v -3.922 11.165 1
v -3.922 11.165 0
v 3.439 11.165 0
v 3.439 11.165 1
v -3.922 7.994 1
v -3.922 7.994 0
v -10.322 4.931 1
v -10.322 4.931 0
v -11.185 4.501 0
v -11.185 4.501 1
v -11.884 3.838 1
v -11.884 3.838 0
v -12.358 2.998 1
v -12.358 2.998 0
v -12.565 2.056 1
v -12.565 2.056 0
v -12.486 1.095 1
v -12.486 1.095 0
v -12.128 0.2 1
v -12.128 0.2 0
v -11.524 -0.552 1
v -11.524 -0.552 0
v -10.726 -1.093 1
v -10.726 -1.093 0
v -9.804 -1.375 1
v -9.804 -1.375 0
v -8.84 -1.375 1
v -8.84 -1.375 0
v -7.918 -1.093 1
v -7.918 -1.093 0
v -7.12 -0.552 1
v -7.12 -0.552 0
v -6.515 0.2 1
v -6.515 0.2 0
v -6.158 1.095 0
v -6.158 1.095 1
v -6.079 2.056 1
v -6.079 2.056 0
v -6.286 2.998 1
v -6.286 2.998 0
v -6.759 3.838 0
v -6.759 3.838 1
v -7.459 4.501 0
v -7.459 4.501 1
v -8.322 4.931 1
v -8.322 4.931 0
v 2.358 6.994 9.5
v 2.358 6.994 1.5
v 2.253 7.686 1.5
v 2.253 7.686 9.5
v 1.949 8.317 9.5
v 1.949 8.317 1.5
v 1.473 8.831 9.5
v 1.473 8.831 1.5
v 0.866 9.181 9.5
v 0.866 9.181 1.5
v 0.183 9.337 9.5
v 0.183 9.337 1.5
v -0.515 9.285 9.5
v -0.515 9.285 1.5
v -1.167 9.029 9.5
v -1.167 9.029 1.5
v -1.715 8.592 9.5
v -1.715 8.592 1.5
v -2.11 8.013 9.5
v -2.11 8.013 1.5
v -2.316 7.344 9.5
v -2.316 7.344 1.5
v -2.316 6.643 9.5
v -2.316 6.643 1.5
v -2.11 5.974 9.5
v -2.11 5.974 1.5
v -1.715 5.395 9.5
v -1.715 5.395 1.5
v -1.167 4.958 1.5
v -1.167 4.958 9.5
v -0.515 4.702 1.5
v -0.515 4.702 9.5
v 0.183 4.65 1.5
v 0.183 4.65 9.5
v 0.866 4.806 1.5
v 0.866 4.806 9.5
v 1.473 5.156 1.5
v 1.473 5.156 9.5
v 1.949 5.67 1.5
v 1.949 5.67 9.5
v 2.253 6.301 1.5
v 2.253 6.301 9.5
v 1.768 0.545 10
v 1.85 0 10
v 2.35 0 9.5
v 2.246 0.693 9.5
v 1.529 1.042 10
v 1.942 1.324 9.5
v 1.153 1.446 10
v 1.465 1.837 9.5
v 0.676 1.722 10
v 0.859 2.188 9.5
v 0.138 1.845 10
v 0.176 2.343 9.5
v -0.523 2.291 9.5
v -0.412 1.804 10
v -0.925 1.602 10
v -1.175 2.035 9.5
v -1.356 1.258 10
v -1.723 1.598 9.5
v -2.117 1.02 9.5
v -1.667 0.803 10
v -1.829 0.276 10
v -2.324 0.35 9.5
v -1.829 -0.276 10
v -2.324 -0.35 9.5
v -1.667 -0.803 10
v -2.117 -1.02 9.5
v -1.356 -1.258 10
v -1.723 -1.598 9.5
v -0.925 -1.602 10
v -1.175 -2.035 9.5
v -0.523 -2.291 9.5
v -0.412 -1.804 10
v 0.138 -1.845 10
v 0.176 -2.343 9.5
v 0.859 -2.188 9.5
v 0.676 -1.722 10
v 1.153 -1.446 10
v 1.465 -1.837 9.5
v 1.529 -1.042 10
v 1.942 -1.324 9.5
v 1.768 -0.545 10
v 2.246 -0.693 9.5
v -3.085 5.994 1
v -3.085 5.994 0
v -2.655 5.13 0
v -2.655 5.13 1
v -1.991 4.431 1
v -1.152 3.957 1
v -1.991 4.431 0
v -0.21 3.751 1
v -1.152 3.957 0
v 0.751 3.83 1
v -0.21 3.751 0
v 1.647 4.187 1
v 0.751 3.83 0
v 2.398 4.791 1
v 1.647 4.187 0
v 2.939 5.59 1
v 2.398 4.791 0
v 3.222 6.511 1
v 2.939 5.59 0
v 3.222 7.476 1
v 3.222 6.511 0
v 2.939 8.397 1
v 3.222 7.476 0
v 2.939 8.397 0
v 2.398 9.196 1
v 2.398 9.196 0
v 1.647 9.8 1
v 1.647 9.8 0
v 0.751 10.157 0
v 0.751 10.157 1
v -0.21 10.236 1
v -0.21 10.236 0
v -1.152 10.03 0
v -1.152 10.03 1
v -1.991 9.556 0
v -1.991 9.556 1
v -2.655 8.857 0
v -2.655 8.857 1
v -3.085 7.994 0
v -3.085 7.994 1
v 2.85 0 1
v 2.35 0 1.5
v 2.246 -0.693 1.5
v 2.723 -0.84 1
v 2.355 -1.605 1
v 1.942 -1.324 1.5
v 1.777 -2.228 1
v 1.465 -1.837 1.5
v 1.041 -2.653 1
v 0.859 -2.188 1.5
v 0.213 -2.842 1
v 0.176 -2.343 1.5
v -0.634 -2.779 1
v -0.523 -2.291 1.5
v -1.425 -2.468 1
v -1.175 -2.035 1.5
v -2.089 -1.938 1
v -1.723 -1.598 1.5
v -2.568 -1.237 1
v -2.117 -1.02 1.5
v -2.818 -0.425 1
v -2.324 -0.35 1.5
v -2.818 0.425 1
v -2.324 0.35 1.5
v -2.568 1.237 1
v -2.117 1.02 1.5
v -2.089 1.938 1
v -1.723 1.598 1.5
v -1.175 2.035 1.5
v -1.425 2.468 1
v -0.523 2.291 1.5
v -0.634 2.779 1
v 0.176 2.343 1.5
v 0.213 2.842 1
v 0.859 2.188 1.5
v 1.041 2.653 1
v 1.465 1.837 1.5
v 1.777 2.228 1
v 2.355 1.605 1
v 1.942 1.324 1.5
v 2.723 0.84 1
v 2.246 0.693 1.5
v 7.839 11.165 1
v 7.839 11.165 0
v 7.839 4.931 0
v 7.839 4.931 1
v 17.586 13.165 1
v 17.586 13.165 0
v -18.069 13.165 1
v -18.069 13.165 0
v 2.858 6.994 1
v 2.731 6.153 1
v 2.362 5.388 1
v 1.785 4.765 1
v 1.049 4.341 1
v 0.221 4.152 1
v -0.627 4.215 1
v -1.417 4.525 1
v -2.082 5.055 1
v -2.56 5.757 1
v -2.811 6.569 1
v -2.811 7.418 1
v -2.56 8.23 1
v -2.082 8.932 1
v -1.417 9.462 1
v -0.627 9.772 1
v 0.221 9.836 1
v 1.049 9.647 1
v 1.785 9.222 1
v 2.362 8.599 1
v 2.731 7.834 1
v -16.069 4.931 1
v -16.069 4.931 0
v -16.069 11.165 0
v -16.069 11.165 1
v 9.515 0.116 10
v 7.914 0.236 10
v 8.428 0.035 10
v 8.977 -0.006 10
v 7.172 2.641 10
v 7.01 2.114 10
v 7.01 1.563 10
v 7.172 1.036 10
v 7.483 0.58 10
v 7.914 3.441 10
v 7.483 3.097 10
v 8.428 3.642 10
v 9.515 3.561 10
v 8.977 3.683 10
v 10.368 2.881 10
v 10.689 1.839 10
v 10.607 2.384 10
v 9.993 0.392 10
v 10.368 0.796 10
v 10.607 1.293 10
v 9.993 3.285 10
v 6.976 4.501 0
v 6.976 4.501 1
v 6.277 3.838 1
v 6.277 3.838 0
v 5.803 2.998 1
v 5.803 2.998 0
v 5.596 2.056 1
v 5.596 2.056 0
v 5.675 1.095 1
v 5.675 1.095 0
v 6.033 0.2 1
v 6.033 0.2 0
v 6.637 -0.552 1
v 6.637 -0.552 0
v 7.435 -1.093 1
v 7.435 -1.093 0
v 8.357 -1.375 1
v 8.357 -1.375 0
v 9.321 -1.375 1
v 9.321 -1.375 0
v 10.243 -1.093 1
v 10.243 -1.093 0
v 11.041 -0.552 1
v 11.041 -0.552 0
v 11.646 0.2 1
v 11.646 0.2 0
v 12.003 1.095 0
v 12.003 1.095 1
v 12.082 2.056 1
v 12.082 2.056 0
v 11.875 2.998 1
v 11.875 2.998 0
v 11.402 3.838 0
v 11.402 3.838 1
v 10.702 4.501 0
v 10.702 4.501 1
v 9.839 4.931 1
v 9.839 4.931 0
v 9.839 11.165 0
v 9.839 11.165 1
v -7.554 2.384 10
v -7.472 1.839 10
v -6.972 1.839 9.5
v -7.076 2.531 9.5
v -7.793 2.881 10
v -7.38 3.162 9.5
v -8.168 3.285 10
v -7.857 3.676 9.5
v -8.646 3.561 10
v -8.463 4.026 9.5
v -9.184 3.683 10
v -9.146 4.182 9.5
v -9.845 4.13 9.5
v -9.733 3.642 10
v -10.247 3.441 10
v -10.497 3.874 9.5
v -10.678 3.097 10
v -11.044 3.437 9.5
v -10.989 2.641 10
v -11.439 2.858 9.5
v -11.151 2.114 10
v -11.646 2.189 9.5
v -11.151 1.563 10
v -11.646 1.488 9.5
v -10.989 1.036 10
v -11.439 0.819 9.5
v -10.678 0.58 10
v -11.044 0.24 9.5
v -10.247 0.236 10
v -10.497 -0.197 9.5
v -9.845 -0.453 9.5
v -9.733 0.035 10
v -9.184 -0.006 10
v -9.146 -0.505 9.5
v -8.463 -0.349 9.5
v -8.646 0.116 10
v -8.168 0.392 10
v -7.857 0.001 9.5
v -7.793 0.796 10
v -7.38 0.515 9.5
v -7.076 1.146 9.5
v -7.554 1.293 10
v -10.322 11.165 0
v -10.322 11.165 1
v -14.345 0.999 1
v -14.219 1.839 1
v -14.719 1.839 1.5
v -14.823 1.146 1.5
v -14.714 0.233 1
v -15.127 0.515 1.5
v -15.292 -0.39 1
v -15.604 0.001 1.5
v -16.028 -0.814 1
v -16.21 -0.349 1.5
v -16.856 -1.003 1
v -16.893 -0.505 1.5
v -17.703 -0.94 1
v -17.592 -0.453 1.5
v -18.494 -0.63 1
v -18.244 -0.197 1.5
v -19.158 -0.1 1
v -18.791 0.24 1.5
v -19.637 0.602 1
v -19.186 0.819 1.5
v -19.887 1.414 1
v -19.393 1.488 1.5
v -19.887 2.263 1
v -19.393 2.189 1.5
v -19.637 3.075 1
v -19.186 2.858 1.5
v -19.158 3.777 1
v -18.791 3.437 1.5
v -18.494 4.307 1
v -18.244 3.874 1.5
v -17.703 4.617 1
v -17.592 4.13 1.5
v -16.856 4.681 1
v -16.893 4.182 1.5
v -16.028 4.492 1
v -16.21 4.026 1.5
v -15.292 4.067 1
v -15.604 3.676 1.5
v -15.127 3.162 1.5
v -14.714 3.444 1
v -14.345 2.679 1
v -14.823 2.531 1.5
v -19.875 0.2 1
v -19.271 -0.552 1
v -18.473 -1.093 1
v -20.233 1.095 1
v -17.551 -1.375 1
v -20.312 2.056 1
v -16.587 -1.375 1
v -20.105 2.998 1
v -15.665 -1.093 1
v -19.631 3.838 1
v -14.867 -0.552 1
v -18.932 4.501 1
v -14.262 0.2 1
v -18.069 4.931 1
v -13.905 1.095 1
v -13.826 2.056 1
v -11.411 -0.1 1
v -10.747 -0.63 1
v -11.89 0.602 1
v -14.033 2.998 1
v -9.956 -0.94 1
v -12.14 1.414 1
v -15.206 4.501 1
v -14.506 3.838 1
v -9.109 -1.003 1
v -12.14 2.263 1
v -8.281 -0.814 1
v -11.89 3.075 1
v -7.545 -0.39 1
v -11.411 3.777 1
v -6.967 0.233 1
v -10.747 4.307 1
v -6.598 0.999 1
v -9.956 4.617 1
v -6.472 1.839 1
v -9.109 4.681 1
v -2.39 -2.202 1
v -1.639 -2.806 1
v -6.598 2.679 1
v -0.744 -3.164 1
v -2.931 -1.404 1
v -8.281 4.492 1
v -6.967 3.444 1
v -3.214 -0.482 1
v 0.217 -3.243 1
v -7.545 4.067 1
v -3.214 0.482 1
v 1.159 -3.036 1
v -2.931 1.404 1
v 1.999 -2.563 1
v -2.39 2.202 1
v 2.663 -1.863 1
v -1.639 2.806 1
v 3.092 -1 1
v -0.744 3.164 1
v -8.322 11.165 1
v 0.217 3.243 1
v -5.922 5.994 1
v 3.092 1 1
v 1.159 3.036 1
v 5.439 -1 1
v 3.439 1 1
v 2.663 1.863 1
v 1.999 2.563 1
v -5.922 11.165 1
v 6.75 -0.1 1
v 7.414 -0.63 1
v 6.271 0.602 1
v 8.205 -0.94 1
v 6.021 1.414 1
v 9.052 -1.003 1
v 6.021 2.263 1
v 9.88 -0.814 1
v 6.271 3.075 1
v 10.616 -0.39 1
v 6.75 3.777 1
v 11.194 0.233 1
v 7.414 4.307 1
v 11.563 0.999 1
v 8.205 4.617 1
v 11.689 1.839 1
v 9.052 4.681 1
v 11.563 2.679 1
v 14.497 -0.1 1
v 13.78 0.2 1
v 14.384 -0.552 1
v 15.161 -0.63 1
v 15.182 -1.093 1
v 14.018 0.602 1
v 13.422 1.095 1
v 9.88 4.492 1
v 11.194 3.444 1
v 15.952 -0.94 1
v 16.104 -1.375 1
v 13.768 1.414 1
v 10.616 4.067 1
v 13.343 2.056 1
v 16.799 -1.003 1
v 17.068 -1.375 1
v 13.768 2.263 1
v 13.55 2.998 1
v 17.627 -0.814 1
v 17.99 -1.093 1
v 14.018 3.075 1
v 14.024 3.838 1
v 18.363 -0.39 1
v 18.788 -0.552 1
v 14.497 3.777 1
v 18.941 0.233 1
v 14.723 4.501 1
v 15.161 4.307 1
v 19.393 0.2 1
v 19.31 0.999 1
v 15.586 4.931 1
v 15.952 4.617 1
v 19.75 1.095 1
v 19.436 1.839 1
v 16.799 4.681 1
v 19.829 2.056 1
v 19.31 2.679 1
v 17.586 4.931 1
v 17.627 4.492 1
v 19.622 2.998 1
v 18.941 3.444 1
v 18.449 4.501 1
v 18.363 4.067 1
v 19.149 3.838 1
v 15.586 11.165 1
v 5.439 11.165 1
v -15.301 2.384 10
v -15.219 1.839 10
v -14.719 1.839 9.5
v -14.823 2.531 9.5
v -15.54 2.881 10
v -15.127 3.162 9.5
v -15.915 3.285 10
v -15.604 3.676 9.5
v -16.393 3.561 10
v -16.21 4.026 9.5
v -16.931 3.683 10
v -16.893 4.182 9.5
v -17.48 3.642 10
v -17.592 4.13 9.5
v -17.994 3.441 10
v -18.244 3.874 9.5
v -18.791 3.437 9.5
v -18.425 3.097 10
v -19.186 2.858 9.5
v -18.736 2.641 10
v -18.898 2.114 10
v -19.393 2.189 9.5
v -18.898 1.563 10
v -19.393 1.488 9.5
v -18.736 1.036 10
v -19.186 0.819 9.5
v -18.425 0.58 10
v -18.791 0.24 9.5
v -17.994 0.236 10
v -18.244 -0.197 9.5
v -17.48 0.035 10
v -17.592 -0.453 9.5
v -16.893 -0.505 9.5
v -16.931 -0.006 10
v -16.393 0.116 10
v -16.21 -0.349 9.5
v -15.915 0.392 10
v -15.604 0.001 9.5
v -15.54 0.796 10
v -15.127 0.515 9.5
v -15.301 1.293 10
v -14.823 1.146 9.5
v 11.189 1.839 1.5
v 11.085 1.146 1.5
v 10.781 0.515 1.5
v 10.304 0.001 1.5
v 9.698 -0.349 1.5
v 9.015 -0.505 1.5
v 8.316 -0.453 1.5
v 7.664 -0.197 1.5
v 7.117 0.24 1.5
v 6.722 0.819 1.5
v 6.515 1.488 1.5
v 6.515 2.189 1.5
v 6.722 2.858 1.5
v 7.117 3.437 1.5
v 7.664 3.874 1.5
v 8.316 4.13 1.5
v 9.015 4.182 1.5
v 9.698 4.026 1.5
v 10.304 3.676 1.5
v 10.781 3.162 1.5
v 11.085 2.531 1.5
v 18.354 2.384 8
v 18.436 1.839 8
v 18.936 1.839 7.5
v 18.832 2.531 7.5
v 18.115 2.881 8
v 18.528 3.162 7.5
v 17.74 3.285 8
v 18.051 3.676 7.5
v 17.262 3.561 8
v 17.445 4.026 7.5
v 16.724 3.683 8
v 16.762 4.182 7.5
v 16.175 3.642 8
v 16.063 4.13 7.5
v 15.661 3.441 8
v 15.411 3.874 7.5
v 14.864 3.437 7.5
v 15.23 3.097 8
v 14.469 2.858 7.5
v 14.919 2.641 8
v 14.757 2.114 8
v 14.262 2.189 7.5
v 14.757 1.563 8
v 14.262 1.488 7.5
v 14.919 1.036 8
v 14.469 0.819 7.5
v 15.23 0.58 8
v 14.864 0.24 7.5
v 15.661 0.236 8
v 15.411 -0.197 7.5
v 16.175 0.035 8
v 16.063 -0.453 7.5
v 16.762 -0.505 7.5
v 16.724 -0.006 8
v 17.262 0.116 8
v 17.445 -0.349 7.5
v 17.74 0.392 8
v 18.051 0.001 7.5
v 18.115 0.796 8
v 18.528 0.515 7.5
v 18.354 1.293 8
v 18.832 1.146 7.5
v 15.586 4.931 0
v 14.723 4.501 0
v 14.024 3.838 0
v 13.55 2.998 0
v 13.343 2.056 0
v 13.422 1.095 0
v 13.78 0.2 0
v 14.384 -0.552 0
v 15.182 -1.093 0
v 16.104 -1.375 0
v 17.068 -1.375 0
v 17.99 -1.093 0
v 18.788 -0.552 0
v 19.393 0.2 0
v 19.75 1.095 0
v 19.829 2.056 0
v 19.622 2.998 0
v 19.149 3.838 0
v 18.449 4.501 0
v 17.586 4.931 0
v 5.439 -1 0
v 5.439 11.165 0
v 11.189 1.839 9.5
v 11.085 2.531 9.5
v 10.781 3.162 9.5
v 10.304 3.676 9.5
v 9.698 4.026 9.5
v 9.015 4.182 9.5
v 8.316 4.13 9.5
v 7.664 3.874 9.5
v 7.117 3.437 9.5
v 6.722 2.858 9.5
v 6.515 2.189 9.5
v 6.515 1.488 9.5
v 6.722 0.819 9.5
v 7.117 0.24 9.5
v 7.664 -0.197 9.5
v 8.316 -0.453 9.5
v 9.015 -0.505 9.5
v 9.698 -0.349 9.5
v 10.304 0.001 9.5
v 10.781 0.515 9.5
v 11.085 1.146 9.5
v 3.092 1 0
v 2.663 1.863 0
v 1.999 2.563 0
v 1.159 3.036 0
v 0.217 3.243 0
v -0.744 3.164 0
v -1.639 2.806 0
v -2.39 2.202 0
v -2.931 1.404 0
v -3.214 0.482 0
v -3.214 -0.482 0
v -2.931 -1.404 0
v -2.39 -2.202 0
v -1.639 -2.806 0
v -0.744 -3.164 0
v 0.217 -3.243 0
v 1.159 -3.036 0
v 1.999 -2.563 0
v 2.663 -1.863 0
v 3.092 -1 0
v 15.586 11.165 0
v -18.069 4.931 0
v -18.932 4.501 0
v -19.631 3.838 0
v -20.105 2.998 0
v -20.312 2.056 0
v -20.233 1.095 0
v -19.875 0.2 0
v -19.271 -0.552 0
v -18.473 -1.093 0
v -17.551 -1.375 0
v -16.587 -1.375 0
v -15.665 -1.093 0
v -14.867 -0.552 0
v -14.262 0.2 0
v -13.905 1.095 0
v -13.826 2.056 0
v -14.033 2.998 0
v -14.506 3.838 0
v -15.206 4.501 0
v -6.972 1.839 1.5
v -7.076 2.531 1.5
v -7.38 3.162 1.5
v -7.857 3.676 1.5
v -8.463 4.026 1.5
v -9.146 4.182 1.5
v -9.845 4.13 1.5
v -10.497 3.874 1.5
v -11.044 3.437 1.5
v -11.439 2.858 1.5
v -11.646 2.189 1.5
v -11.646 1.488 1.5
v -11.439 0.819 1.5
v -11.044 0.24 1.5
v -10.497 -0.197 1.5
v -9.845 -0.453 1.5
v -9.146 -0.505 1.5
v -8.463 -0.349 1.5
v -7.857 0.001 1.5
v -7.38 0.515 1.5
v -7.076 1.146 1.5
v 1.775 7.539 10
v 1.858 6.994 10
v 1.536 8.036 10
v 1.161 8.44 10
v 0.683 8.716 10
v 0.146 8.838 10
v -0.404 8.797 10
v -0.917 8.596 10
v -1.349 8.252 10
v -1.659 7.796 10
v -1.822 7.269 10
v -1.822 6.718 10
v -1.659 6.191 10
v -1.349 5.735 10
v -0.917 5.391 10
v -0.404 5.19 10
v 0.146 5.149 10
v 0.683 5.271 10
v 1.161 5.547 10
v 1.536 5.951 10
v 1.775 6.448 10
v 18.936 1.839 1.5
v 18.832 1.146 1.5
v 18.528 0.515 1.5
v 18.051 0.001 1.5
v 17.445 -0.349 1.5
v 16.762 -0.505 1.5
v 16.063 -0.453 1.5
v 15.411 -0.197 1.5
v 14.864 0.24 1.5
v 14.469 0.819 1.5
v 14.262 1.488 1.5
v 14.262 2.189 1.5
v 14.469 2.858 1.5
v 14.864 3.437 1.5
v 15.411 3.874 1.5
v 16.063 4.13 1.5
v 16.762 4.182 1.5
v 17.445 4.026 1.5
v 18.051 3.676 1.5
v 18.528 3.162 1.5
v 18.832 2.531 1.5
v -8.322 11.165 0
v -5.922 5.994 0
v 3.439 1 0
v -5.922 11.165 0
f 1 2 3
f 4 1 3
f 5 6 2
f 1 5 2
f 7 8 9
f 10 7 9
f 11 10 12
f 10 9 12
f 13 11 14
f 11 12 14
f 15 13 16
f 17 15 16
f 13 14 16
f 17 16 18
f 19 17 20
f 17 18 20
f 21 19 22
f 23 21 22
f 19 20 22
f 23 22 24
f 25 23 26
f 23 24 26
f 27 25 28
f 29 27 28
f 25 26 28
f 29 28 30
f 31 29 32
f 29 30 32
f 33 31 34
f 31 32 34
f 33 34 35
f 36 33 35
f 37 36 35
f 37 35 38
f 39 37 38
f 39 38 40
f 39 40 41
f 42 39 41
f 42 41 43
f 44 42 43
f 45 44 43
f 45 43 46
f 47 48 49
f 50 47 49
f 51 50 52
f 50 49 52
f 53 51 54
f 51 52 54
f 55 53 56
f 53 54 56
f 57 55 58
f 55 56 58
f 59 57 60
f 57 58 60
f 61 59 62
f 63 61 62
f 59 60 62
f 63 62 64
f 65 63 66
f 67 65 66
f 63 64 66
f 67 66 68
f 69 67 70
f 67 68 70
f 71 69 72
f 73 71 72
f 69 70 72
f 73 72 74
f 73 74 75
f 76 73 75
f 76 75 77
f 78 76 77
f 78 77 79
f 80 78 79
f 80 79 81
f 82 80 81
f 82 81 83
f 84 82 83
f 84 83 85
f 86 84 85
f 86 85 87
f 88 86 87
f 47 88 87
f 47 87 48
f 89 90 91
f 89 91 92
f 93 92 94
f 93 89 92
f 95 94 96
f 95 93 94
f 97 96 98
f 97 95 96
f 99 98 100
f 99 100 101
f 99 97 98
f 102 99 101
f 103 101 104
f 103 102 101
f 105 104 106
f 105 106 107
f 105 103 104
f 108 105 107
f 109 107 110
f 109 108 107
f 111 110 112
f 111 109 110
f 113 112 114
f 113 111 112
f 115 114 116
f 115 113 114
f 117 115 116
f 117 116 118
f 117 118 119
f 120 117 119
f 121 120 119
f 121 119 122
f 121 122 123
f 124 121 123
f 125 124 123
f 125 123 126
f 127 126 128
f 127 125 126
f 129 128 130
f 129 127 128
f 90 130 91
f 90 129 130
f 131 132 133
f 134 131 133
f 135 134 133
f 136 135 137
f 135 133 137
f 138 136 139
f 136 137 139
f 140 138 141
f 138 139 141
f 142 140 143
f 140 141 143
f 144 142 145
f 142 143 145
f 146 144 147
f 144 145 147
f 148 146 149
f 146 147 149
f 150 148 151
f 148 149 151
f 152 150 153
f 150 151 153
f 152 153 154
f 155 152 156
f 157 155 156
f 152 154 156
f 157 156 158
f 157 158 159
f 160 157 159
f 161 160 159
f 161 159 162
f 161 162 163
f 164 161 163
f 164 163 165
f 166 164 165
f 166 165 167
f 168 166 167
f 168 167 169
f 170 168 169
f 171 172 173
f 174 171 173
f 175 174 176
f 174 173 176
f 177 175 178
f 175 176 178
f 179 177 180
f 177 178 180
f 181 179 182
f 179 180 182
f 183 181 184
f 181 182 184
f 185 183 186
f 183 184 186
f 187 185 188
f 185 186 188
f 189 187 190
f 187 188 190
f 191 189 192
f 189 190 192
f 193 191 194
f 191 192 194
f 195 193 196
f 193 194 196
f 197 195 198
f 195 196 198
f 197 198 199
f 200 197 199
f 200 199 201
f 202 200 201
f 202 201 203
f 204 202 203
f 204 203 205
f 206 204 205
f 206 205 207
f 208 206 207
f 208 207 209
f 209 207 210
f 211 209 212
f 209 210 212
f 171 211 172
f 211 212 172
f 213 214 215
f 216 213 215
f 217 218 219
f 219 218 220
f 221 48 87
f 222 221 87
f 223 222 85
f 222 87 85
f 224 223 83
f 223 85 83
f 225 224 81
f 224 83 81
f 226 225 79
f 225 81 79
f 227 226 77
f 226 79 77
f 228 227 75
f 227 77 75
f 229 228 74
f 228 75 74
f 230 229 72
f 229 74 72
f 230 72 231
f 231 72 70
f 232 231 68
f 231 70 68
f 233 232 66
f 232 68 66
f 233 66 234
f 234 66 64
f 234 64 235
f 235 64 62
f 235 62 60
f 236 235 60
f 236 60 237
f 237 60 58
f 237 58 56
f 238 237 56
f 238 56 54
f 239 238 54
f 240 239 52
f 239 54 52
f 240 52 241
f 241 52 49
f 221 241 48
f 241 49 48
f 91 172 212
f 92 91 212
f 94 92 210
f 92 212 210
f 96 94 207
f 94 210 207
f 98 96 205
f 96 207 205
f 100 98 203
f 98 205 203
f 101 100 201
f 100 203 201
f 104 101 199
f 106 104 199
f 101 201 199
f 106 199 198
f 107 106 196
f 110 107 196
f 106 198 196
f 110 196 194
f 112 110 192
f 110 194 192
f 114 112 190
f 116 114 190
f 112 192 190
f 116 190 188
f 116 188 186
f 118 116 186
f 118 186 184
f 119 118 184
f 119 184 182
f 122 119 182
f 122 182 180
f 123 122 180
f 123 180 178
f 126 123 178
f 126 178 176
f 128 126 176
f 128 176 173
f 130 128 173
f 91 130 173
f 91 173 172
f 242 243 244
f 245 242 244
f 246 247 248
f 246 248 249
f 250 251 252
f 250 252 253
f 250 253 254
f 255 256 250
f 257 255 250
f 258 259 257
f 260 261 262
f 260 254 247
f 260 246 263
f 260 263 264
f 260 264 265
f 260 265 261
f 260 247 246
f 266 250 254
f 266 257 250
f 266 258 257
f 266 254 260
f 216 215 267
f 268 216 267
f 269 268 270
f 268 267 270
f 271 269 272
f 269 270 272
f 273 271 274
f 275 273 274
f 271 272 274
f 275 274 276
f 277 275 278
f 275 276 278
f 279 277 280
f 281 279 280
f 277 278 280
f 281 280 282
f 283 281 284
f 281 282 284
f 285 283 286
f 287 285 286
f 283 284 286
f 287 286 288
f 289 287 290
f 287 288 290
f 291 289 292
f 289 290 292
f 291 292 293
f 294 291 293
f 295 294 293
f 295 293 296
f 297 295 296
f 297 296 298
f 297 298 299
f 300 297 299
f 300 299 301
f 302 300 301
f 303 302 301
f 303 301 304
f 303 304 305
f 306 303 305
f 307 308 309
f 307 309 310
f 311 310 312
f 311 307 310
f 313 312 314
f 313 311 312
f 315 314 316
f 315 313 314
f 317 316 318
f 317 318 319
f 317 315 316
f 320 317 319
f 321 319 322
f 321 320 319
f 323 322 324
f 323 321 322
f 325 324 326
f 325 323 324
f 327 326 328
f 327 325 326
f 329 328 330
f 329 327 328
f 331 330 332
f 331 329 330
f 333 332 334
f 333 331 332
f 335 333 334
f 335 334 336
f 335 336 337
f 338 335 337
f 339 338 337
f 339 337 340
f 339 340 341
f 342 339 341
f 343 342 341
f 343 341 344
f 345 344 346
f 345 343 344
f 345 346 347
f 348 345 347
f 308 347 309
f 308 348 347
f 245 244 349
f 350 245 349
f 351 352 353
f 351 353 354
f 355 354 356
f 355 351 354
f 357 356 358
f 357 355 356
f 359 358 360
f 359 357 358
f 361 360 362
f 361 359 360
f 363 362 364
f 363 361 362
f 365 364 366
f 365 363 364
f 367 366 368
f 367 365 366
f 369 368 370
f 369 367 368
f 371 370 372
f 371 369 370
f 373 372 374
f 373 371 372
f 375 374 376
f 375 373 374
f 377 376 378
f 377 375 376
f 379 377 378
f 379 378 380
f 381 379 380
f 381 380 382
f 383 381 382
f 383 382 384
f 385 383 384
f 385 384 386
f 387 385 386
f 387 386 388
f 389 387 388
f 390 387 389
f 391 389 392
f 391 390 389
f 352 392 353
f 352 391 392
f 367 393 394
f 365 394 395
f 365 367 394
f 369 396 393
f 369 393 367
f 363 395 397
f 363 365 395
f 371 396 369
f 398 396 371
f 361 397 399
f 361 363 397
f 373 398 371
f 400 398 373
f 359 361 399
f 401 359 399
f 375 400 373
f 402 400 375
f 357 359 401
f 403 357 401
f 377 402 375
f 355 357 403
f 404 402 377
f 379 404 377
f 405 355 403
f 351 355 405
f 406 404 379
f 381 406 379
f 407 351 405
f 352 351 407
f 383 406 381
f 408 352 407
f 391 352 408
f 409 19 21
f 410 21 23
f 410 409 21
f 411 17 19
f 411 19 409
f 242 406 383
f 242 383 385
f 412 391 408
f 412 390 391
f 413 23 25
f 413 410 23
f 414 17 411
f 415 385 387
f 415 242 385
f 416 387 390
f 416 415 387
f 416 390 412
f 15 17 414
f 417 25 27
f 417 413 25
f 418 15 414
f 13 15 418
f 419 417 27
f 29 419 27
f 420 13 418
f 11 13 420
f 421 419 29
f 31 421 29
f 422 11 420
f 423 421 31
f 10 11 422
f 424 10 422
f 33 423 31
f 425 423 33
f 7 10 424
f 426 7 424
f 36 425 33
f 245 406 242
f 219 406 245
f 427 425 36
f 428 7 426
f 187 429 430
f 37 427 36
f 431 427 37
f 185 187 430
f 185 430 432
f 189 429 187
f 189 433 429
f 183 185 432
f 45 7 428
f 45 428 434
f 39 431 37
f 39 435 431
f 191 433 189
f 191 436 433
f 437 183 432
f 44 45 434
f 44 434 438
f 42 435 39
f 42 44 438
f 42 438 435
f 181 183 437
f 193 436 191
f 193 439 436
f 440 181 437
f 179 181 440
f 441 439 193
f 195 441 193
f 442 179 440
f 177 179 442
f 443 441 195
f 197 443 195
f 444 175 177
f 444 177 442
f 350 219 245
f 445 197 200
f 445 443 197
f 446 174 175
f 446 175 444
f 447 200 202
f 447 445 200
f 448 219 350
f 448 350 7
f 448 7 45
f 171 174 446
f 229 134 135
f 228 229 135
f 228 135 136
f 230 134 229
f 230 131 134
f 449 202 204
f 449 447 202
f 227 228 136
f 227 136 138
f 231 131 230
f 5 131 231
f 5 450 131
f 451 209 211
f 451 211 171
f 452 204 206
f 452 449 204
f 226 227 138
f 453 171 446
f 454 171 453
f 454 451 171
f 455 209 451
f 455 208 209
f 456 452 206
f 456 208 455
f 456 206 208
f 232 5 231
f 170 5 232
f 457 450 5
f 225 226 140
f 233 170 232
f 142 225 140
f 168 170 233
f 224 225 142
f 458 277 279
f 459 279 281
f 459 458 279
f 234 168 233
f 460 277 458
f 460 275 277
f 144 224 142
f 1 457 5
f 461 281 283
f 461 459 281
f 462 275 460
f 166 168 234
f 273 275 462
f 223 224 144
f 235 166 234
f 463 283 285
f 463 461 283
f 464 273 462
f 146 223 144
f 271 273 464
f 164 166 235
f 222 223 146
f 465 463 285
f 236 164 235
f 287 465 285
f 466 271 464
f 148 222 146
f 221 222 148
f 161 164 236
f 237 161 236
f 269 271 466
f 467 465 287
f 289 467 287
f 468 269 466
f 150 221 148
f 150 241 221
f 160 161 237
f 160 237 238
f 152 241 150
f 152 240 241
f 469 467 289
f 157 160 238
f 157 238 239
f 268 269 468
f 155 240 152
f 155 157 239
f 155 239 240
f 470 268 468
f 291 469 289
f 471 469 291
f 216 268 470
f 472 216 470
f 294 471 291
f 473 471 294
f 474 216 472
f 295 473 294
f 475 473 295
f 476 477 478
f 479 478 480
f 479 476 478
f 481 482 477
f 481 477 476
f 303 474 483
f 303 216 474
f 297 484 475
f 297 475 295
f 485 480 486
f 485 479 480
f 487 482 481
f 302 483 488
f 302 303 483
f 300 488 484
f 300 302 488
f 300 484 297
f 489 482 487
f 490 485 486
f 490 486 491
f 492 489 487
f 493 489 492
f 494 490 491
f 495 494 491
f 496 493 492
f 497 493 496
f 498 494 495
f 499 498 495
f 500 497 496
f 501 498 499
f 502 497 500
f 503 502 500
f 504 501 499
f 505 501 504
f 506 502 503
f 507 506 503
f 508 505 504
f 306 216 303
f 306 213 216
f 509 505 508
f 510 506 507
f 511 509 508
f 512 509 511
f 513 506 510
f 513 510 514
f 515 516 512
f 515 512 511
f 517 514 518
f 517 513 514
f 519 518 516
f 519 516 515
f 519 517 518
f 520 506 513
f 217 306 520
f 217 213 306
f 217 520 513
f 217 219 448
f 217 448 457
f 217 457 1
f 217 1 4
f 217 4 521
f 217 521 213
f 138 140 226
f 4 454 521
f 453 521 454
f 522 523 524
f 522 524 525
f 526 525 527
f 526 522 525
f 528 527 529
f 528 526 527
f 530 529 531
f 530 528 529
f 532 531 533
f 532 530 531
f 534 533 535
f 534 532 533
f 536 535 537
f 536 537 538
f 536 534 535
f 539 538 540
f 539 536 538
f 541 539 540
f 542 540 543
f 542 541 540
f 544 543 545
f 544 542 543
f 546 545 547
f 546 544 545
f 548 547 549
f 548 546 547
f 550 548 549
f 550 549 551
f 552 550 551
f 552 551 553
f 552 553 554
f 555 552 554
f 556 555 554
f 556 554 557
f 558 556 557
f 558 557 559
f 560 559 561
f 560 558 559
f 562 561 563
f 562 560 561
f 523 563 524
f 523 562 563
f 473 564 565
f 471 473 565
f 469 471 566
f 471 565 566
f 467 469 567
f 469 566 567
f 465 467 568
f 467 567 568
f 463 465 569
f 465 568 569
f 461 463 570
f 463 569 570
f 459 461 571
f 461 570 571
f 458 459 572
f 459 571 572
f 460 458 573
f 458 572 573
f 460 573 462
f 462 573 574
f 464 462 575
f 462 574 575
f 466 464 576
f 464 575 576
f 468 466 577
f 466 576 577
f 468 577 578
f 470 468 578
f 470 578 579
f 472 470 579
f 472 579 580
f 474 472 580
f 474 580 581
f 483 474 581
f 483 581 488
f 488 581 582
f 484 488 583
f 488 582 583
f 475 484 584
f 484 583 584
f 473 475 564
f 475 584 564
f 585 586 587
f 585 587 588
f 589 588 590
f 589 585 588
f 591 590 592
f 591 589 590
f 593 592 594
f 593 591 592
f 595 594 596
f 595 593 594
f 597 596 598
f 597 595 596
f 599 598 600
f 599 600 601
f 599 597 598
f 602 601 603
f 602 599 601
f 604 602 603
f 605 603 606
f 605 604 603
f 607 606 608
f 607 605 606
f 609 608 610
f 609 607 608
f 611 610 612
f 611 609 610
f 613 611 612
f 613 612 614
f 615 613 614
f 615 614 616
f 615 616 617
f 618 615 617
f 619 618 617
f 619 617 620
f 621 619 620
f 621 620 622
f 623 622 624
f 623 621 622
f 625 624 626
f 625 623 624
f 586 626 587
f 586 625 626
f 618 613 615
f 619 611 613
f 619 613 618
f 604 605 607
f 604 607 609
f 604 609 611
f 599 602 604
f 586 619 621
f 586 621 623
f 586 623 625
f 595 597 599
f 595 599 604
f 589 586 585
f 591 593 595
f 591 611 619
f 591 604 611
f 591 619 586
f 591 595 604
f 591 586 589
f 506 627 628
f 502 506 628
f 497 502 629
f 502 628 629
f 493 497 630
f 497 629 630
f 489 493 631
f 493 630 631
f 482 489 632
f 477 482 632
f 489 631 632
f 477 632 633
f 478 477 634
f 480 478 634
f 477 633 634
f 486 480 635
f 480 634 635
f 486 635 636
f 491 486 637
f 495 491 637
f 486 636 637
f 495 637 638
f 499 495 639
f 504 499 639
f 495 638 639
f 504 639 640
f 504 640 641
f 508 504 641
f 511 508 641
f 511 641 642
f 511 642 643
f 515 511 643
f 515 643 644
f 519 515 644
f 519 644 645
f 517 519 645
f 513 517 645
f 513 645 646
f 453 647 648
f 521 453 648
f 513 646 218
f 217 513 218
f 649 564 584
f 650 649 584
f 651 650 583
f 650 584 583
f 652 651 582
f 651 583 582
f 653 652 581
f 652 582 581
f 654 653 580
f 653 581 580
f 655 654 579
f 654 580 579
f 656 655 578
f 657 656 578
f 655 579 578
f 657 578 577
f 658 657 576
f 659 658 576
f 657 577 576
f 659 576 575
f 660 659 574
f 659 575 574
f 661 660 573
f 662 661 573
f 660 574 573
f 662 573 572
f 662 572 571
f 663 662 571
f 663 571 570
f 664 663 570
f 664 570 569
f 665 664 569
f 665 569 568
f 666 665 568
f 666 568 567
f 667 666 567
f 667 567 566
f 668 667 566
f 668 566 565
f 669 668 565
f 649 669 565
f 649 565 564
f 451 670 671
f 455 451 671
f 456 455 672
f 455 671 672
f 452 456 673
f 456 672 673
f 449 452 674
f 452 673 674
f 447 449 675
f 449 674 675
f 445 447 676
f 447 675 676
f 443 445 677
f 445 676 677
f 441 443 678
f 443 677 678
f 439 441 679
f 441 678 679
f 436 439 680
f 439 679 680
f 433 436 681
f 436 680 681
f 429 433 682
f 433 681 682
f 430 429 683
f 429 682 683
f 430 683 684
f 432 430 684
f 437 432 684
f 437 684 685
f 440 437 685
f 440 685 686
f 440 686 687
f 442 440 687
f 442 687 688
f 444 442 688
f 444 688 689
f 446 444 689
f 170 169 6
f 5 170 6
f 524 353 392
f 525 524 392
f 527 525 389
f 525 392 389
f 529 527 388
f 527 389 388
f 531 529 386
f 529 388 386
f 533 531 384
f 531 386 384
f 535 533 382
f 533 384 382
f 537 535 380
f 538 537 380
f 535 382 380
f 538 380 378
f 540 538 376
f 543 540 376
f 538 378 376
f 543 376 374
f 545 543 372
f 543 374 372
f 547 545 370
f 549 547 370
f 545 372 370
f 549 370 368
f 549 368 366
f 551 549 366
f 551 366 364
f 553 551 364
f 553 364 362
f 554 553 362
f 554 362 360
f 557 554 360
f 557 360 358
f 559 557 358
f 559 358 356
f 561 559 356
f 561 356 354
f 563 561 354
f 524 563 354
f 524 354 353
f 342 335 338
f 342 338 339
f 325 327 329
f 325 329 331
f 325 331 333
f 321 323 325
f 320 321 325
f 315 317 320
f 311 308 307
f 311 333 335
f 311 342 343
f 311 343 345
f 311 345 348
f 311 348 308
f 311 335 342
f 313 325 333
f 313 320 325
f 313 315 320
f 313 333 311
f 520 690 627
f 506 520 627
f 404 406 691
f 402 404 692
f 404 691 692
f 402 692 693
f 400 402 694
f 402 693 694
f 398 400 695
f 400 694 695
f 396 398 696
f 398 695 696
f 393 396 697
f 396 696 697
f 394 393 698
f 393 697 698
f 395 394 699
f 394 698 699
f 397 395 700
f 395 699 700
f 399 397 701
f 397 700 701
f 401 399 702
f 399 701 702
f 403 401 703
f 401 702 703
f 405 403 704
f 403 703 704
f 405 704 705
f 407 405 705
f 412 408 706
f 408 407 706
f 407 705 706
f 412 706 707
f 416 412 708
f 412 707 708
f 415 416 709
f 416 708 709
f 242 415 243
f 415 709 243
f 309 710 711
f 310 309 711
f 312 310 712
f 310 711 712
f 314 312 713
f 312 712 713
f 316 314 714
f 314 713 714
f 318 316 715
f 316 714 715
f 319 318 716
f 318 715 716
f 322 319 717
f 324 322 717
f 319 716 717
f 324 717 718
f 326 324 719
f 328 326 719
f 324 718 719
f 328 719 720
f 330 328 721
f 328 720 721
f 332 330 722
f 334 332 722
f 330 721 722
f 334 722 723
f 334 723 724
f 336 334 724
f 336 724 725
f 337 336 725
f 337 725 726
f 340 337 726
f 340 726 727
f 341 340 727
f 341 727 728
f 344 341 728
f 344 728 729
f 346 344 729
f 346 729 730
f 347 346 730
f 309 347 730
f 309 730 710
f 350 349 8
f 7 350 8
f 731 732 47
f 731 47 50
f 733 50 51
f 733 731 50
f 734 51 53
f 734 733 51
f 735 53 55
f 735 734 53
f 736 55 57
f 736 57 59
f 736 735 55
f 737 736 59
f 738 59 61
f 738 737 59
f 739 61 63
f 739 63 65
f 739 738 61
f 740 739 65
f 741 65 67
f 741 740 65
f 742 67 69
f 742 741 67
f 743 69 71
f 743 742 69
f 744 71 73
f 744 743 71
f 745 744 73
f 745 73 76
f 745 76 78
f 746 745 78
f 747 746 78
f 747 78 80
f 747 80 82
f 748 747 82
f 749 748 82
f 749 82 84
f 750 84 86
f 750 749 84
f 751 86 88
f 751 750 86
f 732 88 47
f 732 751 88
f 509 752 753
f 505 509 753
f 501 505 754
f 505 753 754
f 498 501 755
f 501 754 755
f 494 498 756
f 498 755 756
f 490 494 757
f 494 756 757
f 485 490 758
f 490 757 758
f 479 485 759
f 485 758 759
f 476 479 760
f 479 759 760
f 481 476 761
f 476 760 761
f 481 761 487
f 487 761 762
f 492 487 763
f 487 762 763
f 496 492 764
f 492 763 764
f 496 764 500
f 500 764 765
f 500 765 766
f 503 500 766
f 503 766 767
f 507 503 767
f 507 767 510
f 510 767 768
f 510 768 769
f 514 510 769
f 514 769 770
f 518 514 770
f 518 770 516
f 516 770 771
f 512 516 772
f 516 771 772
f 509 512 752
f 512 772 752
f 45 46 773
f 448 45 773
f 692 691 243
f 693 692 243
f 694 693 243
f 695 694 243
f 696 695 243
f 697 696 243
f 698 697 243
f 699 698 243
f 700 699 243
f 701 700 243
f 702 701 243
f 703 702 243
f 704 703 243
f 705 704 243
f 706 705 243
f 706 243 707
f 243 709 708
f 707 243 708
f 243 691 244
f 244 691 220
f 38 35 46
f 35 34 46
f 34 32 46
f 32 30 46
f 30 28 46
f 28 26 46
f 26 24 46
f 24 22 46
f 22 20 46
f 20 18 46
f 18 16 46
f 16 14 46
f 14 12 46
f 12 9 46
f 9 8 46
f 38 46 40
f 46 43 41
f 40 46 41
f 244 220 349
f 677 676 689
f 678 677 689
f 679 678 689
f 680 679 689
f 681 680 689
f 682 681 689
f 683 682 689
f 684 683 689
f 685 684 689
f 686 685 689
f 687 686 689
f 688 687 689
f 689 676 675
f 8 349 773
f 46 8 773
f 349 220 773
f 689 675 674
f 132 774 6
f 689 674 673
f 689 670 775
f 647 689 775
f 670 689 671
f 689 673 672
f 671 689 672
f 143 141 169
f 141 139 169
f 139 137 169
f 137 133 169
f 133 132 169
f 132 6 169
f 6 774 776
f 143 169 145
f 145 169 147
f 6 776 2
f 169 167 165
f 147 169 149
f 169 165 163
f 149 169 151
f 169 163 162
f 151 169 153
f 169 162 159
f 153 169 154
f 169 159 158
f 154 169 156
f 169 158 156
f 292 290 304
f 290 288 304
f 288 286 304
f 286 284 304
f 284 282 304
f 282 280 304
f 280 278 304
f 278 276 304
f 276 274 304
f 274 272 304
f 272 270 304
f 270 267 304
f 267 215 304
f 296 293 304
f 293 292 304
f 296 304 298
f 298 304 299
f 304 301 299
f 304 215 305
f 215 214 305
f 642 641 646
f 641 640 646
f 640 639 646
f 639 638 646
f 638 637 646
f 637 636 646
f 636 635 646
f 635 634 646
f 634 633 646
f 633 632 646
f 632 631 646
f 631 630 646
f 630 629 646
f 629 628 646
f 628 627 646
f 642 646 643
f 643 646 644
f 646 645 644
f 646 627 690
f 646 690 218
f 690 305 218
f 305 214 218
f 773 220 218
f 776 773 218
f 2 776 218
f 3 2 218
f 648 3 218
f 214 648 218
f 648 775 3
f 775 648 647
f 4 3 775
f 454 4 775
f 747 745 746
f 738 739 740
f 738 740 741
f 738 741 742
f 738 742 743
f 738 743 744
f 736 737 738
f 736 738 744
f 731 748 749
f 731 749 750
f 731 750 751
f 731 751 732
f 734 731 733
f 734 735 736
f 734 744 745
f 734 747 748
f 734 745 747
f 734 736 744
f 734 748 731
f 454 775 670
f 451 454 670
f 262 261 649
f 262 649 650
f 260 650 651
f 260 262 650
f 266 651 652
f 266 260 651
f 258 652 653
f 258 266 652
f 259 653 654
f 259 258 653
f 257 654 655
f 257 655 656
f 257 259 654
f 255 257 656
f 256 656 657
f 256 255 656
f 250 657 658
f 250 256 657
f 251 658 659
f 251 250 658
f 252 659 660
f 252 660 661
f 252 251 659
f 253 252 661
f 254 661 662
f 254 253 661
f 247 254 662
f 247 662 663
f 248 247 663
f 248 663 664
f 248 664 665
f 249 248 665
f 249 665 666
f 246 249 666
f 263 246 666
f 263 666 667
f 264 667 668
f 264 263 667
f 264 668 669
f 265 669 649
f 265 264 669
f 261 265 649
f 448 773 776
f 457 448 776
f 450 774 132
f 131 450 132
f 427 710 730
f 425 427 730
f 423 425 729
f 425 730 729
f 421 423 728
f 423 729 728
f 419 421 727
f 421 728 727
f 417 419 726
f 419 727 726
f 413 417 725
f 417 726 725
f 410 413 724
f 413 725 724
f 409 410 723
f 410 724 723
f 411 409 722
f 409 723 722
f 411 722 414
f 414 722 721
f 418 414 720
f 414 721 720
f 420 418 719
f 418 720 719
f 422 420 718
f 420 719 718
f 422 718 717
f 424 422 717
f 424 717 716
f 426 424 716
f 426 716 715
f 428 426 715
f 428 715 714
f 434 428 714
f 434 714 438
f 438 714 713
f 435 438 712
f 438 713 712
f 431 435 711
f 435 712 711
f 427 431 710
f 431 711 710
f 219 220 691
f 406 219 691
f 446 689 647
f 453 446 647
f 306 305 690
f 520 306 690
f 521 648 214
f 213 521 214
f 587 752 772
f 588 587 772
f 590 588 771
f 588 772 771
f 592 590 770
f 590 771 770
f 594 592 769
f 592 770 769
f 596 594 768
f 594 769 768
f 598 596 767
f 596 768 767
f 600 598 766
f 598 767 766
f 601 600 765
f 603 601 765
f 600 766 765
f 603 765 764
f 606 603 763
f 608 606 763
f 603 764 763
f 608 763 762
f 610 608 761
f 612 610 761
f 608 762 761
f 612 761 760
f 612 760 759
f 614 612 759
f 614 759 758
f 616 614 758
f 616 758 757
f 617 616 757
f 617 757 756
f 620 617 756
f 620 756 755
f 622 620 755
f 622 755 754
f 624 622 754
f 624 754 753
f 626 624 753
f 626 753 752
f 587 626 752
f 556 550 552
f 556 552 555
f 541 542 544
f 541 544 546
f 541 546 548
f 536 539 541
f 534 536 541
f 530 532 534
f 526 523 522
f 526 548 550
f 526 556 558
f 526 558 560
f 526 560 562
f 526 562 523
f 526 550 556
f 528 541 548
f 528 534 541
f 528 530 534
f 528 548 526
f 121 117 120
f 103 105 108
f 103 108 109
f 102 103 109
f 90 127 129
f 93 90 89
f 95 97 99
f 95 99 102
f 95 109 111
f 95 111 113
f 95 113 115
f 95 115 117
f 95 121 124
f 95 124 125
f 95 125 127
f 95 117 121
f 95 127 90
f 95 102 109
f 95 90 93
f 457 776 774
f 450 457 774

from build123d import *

# Parameters (mm, degrees)
SKIZZE1_R                         = 2.35
AUFSATZ_LINEAR_AUSTRAGEN1_DEPTH   = 10
AUFSATZ_LINEAR_AUSTRAGEN1_2_DEPTH = 10
AUFSATZ_LINEAR_AUSTRAGEN1_3_DEPTH = 10
AUFSATZ_LINEAR_AUSTRAGEN1_4_DEPTH = 10
AUFSATZ_LINEAR_AUSTRAGEN1_5_DEPTH = 10
SKIZZE1_3_R                       = 2.35
AUFSATZ_LINEAR_AUSTRAGEN4_DEPTH   = 8
SKIZZE2_R                         = 3.25
AUFSATZ_LINEAR_AUSTRAGEN2_DEPTH   = 1
AUFSATZ_LINEAR_AUSTRAGEN3_DEPTH   = 1
FASE1_SIZE                        = 0.5
FASE2_SIZE                        = 0.5
FASE3_SIZE                        = 0.5


with BuildPart() as part:
    # Skizze1 → Aufsatz-Linear austragen1 (new body)
    with BuildSketch(Plane.XY):
        with Locations((-17.068817434, 1.838554139)):
            Circle(SKIZZE1_R)
    extrude(amount=AUFSATZ_LINEAR_AUSTRAGEN1_DEPTH)



with BuildPart() as body_2:
    # Skizze1 → Aufsatz-Linear austragen1 2 (new body)
    with BuildSketch(Plane.XY):
        with Locations((-9.321817434, 1.838554139)):
            Circle(SKIZZE1_R)
    extrude(amount=AUFSATZ_LINEAR_AUSTRAGEN1_2_DEPTH)


with BuildPart() as body_3:
    # Skizze1 → Aufsatz-Linear austragen1 3 (new body)
    with BuildSketch(Plane.XY):
        Circle(SKIZZE1_R)
    extrude(amount=AUFSATZ_LINEAR_AUSTRAGEN1_3_DEPTH)


with BuildPart() as body_4:
    # Skizze1 → Aufsatz-Linear austragen1 4 (new body)
    with BuildSketch(Plane.XY):
        with Locations((0.007570249, 6.993531953)):
            Circle(SKIZZE1_R)
    extrude(amount=AUFSATZ_LINEAR_AUSTRAGEN1_4_DEPTH)


with BuildPart() as body_5:
    # Skizze1 → Aufsatz-Linear austragen1 5 (new body)
    with BuildSketch(Plane.XY):
        with Locations((8.839182566, 1.838554139)):
            Circle(SKIZZE1_R)
    extrude(amount=AUFSATZ_LINEAR_AUSTRAGEN1_5_DEPTH)


with BuildPart() as body_6:
    # Skizze1<3> → Aufsatz-Linear austragen4 (new body)
    with BuildSketch(Plane.XY):
        with Locations((16.586182566, 1.838554139)):
            Circle(SKIZZE1_3_R)
    extrude(amount=AUFSATZ_LINEAR_AUSTRAGEN4_DEPTH)


with BuildPart() as part_1:
    add(part.part)

    add(body_2.part)  # Aufsatz-Linear austragen2 merges body 2

    add(body_3.part)  # Aufsatz-Linear austragen2 merges body 3

    add(body_4.part)  # Aufsatz-Linear austragen2 merges body 4

    add(body_5.part)  # Aufsatz-Linear austragen2 merges body 5

    add(body_6.part)  # Aufsatz-Linear austragen2 merges body 6
    # Skizze2 → Aufsatz-Linear austragen2 (add)
    with BuildSketch(Plane.XY):
        with Locations((-17.068817434, 1.838554139)):
            Circle(SKIZZE2_R)
        with Locations((-9.321817434, 1.838554139)):
            Circle(SKIZZE2_R)
        Circle(SKIZZE2_R)
        with Locations((0.007570249, 6.993531953)):
            Circle(SKIZZE2_R)
        with Locations((8.839182566, 1.838554139)):
            Circle(SKIZZE2_R)
        with Locations((16.586182566, 1.838554139)):
            Circle(SKIZZE2_R)
    extrude(amount=AUFSATZ_LINEAR_AUSTRAGEN2_DEPTH)

    # Skizze3 → Aufsatz-Linear austragen3 (add)
    with BuildSketch(Plane.XY):
        Polygon((-18.068817434, 13.164615586), (-18.068817434, 4.930883358), (-16.068817434, 4.930883358), (-16.068817434, 11.164615586), (-10.321817434, 11.164615586), (-10.321817434, 4.930883358), (-8.321817434, 4.930883358), (-8.321817434, 11.164615586), (-5.921817434, 11.164615586), (-5.921817434, 5.993531953), (-3.08475897, 5.993531953), (-3.08475897, 7.993531953), (-3.921817434, 7.993531953), (-3.921817434, 11.164615586), (3.439182566, 11.164615586), (3.439182566, 1), (3.092329219, 1), (3.092329219, -1), (3.439182566, -1), (5.439182566, -1), (5.439182566, 1), (5.439182566, 11.164615586), (7.839182566, 11.164615586), (7.839182566, 4.930883358), (9.839182566, 4.930883358), (9.839182566, 11.164615586), (15.586182566, 11.164615586), (15.586182566, 4.930883358), (17.586182566, 4.930883358), (17.586182566, 13.164615586), align=None)
    extrude(amount=AUFSATZ_LINEAR_AUSTRAGEN3_DEPTH)

    # Fase1
    fase1_edges = [part_1.edges().sort_by_distance(p)[0] for p in [
        (-19.418817434, 1.838554139, 10),
        (-2.35, 0, 10),
        (-2.342429751, 6.993531953, 10),
        (6.489182566, 1.838554139, 10),
        (-11.671817434, 1.838554139, 10),
    ]]
    chamfer(fase1_edges, length=FASE1_SIZE)

    # Fase2
    fase2_edges = [part_1.edges().sort_by_distance(p)[0] for p in [
        (-19.418817434, 1.838554139, 1),
        (-2.35, 0, 1),
        (-2.342429751, 6.993531953, 1),
        (6.489182566, 1.838554139, 1),
        (14.236182566, 1.838554139, 1),
        (-11.671817434, 1.838554139, 1),
    ]]
    chamfer(fase2_edges, length=FASE2_SIZE)

    # Fase3
    fase3_edges = [part_1.edges().sort_by_distance(p)[0] for p in [
        (14.236182566, 1.838554139, 8),
    ]]
    chamfer(fase3_edges, length=FASE3_SIZE)


solid = part_1.part
